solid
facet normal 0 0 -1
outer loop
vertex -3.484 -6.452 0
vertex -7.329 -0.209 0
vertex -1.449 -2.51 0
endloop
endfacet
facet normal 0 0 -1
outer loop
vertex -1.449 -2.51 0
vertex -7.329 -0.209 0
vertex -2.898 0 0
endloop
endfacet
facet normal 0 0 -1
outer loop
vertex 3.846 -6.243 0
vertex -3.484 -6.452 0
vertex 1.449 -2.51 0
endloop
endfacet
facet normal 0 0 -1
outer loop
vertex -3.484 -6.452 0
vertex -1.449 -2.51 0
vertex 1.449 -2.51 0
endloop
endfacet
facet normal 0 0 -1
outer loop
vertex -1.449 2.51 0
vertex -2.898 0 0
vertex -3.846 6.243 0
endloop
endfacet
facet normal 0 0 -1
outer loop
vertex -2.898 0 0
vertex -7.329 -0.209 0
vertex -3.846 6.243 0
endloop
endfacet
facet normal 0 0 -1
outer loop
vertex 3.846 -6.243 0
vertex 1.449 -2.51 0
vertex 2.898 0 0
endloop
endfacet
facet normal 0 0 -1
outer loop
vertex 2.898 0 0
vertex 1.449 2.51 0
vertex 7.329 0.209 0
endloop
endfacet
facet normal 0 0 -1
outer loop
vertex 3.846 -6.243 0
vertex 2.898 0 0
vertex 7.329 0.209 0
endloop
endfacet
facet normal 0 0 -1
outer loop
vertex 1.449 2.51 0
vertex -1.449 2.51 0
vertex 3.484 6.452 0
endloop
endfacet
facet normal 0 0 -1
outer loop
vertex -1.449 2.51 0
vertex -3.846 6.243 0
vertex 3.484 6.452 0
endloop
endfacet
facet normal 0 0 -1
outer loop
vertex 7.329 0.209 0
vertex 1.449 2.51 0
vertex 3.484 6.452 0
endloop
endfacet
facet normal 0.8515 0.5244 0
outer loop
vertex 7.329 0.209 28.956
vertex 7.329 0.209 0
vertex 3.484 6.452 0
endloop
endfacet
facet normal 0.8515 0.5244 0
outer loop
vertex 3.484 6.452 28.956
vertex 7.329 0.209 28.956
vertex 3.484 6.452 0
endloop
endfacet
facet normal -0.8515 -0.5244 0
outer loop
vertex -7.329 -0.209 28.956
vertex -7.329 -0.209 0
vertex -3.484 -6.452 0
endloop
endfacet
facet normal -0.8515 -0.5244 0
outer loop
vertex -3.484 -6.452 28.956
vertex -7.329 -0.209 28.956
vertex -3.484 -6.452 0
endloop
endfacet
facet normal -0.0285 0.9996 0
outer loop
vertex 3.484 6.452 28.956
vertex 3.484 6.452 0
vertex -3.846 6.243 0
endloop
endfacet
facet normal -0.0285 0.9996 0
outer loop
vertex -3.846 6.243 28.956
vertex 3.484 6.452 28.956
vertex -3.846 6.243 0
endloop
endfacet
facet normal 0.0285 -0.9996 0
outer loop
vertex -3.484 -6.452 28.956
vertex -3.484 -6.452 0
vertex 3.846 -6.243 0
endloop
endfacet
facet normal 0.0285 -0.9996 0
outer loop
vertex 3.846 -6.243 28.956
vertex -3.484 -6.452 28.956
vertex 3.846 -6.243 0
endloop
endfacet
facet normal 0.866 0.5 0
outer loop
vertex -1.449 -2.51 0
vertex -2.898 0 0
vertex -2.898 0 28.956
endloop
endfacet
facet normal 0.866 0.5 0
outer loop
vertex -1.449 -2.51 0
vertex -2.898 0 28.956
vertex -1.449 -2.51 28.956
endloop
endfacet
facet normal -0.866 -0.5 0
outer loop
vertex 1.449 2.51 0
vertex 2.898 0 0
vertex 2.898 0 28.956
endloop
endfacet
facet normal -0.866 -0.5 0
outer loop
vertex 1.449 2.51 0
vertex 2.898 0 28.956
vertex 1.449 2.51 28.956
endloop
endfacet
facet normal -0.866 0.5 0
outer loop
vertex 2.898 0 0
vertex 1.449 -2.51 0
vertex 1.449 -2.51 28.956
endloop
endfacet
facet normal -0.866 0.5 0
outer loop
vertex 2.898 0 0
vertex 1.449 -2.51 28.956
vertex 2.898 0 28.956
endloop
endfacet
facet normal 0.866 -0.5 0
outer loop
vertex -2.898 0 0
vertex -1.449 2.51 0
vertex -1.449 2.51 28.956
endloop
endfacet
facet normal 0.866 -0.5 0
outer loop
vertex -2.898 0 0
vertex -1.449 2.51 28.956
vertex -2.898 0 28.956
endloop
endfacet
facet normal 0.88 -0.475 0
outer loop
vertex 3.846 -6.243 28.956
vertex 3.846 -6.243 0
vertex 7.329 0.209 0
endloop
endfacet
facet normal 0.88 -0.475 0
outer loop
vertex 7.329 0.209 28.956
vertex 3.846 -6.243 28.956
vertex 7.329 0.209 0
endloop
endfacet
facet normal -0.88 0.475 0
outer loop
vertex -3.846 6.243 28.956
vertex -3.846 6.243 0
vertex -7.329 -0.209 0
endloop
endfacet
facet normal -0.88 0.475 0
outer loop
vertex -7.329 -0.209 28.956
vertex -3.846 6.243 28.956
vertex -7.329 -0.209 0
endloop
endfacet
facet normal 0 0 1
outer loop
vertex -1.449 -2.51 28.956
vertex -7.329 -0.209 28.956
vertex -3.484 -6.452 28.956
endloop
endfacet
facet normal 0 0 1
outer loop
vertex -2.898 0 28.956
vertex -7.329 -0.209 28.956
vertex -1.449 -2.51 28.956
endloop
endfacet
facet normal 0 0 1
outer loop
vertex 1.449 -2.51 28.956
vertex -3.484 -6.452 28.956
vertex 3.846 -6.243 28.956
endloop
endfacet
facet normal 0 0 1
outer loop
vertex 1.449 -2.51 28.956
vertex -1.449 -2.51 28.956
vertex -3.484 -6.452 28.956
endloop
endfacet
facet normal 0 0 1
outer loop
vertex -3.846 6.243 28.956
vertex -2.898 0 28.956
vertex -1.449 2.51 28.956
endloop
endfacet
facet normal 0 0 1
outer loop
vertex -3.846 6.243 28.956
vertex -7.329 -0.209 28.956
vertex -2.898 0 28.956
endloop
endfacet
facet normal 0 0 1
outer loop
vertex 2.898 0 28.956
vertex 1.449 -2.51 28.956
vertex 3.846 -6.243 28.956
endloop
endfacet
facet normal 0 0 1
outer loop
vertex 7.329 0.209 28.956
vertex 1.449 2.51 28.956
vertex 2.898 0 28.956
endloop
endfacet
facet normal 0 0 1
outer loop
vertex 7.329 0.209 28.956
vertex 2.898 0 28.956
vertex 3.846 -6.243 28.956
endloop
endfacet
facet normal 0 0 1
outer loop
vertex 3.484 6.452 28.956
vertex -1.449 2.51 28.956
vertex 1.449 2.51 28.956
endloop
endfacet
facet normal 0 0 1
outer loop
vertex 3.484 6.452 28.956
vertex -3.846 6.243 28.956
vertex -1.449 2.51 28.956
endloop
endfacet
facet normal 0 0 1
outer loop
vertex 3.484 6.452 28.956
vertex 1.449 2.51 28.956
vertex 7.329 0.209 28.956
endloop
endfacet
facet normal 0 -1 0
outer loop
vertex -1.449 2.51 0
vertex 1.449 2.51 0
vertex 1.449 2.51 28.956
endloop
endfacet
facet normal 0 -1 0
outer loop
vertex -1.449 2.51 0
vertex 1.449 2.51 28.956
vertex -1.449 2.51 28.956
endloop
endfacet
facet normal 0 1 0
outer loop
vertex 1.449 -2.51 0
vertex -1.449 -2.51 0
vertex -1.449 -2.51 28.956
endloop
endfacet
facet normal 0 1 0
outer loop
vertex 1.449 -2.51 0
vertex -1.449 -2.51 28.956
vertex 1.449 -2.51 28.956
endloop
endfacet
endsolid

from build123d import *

# Parameters (mm, degrees)
BOSS_EXTRUDE2_DEPTH = 28.956


with BuildPart() as part:
    # Sketch4 → Boss-Extrude2 (new body)
    # profile 1 of 2: a face of its own
    with BuildSketch(Plane.XY):
        Polygon((-3.483559495, -6.4519878), (3.845805592, -6.242844919), (7.329365088, 0.209142882), (3.483559495, 6.4519878), (-3.845805592, 6.242844919), (-7.329365088, -0.209142882), align=None)
        Polygon((2.306514325, -3.995), (4.613028651, 0), (2.306514325, 3.995), (-2.306514325, 3.995), (-4.613028651, 0), (-2.306514325, -3.995), align=None, mode=Mode.SUBTRACT)
    # profile 2 of 2: a face of its own
    with BuildSketch(Plane.XY):
        Polygon((-2.306514325, -3.995), (2.306514325, -3.995), (4.613028651, 0), (2.306514325, 3.995), (-2.306514325, 3.995), (-4.613028651, 0), align=None)
        Polygon((1.449149176, -2.51), (2.898298351, 0), (1.449149176, 2.51), (-1.449149176, 2.51), (-2.898298351, 0), (-1.449149176, -2.51), align=None, mode=Mode.SUBTRACT)
    extrude(amount=BOSS_EXTRUDE2_DEPTH)


solid = part.part
